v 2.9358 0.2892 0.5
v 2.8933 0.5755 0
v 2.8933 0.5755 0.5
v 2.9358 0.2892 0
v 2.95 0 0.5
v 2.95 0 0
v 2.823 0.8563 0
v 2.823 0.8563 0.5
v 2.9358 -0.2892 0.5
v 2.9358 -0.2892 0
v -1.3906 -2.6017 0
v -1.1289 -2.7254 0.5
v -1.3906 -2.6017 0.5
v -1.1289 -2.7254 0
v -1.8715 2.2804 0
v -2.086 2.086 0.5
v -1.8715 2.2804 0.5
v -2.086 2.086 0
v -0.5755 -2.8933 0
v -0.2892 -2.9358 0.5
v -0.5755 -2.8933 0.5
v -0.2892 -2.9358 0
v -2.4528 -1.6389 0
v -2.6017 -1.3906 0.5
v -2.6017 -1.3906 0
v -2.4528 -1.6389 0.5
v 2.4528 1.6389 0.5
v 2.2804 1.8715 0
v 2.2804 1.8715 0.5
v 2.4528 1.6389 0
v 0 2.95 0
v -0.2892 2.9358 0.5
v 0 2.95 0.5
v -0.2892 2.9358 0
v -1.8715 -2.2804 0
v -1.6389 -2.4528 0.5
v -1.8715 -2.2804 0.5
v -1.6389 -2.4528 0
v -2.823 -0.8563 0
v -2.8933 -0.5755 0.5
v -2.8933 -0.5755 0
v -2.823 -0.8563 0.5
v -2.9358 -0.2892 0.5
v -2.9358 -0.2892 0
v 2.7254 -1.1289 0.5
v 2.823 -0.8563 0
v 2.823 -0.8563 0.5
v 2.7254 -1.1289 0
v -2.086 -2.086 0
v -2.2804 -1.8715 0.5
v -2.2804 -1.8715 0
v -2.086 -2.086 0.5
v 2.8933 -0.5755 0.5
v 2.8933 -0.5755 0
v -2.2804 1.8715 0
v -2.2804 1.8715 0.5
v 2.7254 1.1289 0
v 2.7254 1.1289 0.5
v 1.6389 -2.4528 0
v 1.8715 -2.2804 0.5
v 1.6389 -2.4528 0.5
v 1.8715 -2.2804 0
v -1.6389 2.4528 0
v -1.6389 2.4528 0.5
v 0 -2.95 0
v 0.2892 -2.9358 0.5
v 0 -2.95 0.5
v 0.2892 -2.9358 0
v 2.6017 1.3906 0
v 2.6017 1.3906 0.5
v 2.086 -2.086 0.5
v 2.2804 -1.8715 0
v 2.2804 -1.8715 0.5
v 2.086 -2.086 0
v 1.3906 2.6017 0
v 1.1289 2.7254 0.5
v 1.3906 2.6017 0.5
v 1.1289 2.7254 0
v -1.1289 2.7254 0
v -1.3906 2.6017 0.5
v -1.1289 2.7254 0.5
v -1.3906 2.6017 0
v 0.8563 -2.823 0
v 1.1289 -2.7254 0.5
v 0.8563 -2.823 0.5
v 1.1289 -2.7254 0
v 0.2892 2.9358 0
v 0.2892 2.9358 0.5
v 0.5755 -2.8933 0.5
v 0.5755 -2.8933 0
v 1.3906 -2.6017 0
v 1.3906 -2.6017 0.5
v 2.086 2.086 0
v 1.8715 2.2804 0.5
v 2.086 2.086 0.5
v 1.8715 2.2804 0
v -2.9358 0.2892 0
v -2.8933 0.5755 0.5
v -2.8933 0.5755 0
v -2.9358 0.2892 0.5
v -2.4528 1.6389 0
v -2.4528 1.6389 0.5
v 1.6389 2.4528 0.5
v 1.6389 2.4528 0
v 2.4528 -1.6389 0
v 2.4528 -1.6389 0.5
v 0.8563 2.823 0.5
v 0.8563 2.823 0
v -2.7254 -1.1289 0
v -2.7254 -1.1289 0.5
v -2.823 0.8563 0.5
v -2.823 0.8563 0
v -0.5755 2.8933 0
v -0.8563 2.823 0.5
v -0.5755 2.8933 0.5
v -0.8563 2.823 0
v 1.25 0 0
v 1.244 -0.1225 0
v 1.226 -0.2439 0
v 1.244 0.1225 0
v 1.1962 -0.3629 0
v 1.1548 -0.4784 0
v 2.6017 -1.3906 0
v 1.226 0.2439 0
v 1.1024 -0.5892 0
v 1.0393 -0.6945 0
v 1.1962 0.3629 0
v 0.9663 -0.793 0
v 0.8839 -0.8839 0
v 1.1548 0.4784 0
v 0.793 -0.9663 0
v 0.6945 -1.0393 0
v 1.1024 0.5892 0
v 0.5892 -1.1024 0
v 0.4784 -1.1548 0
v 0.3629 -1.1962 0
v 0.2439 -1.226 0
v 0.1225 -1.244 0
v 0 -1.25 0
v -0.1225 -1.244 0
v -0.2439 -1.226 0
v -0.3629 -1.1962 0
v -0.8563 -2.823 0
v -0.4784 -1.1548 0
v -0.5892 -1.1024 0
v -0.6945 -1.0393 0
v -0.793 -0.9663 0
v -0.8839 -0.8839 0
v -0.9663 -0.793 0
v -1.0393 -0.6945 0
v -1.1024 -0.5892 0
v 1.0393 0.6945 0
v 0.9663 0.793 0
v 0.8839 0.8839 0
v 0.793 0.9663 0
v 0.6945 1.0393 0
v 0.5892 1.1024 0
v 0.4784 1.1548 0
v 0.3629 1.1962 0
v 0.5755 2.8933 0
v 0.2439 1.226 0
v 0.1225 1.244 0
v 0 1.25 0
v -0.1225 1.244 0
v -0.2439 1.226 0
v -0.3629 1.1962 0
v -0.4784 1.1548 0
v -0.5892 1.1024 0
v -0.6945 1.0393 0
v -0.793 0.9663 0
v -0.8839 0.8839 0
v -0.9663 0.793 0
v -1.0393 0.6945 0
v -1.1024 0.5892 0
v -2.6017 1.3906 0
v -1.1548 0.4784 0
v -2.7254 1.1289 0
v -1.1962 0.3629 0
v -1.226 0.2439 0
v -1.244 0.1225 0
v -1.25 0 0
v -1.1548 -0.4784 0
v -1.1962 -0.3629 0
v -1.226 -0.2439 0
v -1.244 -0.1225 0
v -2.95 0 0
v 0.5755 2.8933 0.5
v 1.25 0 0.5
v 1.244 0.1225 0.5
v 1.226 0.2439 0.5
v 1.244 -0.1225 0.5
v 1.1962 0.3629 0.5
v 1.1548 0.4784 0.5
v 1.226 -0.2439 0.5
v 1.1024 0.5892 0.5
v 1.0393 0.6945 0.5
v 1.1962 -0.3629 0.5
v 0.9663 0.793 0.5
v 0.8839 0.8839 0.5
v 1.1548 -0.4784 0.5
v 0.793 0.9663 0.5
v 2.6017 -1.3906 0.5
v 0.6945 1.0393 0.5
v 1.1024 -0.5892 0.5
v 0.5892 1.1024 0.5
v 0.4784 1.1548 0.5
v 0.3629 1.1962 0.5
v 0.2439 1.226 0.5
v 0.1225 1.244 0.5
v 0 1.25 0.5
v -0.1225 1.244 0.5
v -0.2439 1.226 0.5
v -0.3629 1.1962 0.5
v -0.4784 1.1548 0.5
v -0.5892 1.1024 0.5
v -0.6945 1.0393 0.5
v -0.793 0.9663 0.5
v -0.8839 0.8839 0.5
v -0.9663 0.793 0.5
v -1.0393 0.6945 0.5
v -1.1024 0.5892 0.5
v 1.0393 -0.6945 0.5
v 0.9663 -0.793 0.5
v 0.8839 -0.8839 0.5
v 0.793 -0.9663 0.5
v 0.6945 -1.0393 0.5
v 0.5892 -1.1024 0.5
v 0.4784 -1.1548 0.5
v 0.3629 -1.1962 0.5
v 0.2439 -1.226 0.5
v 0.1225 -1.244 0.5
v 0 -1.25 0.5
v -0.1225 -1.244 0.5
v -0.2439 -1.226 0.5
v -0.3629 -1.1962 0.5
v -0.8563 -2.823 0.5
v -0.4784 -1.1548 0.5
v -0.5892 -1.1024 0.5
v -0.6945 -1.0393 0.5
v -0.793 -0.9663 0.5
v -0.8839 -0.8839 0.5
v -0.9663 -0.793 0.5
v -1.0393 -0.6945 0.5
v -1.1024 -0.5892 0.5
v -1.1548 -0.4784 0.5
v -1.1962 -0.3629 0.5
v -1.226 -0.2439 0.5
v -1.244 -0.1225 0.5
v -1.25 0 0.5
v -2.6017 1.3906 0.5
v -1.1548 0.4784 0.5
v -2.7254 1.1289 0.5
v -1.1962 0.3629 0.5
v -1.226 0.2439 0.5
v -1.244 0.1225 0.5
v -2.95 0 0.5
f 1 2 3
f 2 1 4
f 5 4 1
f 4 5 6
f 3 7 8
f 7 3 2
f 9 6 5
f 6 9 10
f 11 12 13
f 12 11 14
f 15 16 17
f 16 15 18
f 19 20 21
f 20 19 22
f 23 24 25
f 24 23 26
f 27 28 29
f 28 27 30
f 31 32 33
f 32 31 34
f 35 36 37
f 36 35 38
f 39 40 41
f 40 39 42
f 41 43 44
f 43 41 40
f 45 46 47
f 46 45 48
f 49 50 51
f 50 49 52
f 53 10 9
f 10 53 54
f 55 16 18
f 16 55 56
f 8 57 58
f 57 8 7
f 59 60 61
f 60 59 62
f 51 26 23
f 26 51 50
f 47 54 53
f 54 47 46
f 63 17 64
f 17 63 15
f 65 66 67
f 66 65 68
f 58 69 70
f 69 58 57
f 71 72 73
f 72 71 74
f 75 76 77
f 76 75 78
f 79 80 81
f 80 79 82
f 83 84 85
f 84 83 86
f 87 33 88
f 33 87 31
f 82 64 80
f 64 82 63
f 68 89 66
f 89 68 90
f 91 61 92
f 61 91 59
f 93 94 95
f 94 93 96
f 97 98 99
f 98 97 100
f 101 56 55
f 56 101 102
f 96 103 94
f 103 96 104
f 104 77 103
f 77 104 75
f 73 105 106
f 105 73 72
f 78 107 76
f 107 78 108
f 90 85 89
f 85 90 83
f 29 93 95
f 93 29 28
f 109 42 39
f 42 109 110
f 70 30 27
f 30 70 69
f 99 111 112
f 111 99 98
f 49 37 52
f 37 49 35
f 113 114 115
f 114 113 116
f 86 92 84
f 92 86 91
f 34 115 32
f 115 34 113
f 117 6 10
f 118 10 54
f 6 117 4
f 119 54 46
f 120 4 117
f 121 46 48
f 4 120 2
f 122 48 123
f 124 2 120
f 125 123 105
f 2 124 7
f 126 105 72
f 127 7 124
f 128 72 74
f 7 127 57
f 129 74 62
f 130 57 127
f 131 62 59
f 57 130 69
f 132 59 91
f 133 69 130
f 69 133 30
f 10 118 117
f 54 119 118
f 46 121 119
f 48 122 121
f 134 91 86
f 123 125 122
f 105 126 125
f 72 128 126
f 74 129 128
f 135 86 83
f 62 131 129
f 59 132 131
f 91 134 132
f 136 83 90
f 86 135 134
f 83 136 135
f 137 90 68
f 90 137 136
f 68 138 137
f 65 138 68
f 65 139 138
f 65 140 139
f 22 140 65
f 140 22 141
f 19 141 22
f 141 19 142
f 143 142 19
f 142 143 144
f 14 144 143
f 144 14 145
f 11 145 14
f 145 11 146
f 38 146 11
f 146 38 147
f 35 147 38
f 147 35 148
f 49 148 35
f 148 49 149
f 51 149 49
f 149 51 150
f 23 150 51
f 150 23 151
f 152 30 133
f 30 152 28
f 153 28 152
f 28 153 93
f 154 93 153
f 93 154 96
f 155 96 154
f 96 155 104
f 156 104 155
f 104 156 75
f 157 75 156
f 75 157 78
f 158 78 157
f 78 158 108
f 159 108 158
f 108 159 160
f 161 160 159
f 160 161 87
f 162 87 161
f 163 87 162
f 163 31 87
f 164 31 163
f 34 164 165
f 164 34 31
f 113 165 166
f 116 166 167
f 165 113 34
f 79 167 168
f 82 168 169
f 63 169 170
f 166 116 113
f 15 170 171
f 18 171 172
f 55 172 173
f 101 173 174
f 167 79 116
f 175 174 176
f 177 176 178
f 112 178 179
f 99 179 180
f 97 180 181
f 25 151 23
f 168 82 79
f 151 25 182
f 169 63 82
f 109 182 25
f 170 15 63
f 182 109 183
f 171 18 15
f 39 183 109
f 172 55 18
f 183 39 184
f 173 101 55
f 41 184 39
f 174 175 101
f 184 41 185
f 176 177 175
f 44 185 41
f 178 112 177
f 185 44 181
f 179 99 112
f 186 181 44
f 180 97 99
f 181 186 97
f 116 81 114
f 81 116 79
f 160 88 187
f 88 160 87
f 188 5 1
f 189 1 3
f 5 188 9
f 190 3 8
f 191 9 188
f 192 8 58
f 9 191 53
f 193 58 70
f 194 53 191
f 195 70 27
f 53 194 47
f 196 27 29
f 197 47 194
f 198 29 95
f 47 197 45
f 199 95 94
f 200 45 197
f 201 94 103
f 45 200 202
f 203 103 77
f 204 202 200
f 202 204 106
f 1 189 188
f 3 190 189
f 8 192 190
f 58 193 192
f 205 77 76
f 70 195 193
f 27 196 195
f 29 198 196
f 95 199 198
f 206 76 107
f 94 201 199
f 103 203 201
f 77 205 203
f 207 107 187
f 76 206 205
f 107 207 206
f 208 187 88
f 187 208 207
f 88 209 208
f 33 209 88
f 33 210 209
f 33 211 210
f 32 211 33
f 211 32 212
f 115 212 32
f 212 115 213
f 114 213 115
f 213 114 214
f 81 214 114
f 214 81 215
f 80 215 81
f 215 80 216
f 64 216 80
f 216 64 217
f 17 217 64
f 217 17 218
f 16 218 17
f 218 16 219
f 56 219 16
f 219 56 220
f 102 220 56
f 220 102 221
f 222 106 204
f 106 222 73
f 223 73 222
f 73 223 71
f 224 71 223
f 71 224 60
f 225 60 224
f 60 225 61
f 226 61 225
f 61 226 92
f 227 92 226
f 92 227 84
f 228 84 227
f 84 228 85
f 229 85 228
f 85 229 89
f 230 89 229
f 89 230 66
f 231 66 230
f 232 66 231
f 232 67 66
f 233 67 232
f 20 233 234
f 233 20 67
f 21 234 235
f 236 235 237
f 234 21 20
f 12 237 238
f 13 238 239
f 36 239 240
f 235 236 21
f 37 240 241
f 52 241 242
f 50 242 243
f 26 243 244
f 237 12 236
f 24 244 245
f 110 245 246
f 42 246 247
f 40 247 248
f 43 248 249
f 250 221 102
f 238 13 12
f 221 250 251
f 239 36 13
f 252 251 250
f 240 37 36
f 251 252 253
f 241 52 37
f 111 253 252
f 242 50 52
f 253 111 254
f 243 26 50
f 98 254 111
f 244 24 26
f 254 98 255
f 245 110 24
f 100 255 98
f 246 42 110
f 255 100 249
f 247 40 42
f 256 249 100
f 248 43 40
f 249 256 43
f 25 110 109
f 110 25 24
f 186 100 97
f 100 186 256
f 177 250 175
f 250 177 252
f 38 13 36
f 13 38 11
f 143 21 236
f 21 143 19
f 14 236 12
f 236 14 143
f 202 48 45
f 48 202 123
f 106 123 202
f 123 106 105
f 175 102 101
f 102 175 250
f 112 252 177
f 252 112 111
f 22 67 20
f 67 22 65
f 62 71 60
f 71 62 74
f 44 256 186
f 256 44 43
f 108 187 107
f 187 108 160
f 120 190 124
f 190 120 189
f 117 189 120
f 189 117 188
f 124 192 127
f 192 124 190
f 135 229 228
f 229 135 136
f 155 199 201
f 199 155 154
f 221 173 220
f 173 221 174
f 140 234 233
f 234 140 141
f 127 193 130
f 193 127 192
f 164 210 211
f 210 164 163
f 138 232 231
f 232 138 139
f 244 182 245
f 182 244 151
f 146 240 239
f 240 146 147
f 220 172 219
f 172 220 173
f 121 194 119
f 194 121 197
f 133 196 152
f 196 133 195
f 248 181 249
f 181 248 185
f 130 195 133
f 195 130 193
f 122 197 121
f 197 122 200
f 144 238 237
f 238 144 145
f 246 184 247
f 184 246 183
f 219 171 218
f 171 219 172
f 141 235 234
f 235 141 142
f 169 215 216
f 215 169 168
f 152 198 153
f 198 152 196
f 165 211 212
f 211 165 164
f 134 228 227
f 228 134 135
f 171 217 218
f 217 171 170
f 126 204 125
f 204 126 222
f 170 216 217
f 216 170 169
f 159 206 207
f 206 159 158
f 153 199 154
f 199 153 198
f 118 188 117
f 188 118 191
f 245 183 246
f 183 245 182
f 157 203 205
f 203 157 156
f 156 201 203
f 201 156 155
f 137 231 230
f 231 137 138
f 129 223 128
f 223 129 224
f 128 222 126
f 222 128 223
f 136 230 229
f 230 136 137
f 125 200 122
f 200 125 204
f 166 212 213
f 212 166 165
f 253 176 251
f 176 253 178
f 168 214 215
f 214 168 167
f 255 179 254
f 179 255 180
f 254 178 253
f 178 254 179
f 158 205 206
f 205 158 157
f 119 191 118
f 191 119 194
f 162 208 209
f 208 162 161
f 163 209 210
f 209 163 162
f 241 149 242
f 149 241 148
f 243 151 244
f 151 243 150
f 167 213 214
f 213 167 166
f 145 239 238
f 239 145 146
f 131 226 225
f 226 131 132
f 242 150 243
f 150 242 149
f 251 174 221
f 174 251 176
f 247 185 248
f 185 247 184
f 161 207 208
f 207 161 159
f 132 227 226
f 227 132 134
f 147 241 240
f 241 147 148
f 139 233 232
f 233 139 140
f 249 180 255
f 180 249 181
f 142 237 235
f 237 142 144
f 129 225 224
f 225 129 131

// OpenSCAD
difference() {
    cylinder(h=0.5, d=5.9, $fn=64);
    translate([0, 0, -0.1])
        cylinder(h=0.7, d=2.5, $fn=64);
}
